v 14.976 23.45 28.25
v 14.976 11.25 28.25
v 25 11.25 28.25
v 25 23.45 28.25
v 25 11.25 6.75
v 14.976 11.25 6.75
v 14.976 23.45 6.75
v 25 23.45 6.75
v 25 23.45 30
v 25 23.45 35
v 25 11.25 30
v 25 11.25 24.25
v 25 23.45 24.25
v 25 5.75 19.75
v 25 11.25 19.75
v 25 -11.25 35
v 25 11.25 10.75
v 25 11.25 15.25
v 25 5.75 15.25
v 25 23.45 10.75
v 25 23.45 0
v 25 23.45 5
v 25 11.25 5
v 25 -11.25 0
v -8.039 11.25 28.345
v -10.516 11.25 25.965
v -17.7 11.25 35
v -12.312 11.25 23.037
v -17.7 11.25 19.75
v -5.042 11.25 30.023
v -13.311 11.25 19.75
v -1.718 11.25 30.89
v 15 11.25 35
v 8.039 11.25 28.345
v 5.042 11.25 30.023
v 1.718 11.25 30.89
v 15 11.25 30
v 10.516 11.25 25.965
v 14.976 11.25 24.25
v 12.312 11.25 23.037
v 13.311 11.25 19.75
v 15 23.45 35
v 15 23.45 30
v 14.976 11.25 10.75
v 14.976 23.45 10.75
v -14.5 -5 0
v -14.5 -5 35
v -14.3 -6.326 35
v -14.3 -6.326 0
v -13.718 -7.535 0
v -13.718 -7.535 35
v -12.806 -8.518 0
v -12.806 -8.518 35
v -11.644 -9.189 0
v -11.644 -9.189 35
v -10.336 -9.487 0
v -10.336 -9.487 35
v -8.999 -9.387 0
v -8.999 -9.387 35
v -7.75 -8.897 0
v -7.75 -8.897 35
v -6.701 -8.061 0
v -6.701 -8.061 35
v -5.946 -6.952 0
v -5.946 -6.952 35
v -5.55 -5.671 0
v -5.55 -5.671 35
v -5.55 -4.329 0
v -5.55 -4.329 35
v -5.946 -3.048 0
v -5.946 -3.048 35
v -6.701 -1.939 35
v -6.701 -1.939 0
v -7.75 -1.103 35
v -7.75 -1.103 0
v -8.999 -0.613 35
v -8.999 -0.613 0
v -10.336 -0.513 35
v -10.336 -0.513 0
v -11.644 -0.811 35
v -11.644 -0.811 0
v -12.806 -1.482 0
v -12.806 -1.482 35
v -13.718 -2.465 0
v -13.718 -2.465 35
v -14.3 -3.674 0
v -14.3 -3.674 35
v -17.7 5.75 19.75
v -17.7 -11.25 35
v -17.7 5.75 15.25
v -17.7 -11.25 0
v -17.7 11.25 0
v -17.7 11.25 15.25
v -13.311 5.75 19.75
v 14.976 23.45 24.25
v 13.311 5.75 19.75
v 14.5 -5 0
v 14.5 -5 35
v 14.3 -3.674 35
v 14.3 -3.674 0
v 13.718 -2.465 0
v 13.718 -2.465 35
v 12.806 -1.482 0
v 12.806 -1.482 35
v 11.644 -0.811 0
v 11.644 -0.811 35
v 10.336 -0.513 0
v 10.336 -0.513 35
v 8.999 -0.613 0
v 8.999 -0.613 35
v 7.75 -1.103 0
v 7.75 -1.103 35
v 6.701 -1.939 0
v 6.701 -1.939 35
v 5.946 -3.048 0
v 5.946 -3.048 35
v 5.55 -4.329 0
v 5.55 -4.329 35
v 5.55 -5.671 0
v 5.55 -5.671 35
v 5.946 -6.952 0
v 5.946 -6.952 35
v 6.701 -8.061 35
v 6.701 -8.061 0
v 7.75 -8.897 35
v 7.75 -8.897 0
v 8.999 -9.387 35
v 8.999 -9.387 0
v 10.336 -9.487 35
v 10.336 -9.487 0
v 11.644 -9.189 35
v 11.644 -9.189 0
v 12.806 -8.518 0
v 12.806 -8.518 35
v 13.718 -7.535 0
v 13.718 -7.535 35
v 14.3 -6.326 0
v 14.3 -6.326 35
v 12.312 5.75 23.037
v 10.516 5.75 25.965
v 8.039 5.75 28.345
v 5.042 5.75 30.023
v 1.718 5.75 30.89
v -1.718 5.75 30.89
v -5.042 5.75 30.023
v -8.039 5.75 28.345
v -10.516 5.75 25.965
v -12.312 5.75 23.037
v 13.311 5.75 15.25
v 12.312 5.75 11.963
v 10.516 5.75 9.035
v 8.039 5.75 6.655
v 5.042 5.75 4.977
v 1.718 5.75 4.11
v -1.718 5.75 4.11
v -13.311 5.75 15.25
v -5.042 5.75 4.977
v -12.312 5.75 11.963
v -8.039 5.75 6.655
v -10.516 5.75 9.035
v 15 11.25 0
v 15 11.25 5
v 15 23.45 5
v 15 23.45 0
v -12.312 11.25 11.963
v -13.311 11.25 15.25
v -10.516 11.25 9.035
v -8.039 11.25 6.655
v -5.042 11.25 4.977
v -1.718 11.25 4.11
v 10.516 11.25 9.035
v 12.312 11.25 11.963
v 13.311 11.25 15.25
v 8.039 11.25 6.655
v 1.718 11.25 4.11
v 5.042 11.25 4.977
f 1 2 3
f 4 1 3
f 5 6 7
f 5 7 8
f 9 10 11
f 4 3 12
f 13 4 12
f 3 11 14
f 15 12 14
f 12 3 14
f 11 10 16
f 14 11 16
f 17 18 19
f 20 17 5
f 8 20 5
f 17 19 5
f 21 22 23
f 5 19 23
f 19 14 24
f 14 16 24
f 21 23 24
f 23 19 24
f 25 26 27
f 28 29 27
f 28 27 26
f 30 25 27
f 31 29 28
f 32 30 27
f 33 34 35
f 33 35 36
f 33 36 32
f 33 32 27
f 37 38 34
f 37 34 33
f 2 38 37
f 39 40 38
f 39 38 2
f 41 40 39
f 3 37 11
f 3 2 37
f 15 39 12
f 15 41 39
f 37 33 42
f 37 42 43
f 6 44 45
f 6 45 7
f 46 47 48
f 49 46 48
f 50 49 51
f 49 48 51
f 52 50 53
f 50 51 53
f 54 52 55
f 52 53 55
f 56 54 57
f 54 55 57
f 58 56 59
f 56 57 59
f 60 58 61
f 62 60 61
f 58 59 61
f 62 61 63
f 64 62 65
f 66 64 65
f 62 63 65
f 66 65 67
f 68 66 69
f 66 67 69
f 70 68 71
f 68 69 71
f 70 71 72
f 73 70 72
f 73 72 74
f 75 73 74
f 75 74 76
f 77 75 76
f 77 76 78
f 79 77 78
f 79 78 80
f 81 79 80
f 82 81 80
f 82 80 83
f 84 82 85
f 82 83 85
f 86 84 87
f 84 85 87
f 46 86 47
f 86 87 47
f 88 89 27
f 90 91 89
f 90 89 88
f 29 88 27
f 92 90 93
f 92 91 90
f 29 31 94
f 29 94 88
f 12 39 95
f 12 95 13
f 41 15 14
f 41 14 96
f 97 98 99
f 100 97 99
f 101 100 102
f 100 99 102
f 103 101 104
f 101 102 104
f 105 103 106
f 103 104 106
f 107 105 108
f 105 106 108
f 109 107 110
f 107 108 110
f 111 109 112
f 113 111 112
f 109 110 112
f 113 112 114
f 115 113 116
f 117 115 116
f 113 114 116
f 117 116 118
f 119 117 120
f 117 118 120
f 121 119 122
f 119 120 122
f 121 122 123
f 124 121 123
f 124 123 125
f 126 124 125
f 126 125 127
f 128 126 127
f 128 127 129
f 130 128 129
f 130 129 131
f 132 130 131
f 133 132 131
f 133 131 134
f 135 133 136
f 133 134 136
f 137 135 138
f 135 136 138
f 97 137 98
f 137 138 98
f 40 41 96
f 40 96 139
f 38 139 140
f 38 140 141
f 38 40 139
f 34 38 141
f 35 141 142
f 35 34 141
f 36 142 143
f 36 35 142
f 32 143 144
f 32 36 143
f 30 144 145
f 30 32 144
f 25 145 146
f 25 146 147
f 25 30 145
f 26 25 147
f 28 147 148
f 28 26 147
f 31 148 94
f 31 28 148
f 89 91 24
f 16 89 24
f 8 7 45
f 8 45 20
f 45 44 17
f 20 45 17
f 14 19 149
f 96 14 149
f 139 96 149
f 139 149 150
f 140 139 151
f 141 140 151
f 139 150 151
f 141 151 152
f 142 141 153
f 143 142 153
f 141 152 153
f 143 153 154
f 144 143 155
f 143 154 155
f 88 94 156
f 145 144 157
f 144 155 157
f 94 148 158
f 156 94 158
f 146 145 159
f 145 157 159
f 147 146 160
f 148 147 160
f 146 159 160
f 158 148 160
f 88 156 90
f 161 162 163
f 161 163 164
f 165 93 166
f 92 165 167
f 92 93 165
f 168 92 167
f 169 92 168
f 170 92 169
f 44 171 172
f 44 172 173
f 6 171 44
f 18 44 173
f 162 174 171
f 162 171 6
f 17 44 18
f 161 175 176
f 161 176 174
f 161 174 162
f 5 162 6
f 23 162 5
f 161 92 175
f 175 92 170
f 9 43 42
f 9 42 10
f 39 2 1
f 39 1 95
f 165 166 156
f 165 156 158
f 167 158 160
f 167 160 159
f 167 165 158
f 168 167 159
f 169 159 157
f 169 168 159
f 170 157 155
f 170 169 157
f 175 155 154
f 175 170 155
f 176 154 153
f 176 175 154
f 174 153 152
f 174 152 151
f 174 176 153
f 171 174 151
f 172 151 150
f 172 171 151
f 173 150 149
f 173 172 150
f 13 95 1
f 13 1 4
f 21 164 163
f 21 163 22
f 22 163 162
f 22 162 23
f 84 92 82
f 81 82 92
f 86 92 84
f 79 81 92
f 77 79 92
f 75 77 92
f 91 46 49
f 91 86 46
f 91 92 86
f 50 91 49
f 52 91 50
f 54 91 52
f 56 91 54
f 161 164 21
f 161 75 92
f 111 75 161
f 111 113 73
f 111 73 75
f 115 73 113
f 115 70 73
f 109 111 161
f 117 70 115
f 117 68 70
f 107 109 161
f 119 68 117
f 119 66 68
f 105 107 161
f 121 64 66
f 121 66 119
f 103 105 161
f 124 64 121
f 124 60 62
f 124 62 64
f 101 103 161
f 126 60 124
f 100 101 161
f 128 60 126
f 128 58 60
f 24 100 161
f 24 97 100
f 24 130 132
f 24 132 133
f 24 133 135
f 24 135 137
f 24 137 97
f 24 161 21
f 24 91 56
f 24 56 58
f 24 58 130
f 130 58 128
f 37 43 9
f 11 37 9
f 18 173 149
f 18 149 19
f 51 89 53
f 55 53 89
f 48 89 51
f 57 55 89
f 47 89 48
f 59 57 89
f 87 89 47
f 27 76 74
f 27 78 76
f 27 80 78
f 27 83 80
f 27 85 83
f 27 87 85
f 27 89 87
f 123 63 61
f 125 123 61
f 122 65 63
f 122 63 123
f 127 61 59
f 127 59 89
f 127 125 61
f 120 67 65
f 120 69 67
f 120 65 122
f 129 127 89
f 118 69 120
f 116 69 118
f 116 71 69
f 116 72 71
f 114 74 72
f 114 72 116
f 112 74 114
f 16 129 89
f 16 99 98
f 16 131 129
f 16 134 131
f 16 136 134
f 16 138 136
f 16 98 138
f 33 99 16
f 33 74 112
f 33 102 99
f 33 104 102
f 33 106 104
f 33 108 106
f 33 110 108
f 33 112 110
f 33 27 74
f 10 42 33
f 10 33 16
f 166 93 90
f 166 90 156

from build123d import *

# Parameters (mm, degrees)
SKETCH1_W           = 50
SKETCH1_H           = 22.5
BOSS_EXTRUDE1_DEPTH = 35
SKETCH2_R           = 4.5
CUT_EXTRUDE1_DEPTH  = 35
CUT_EXTRUDE2_DEPTH  = 5.5
SKETCH4_W           = 10
SKETCH4_H           = 5
SKETCH4_W_2         = 10.024005515
SKETCH4_H_2         = 4
BOSS_EXTRUDE2_DEPTH = 12.2
SKETCH5_W           = 7.3
SKETCH5_H           = 22.5
CUT_EXTRUDE3_DEPTH  = 49.98879974


with BuildPart() as part:
    # Sketch1 → Boss-Extrude1 (new body)
    with BuildSketch(Plane.XY):
        Rectangle(SKETCH1_W, SKETCH1_H)
    extrude(amount=BOSS_EXTRUDE1_DEPTH)

    # Sketch2 → Cut-Extrude1 (cut)
    with BuildSketch(Plane.XY.offset(35)):
        with Locations((10, -5)):
            Circle(SKETCH2_R)
        with Locations(Location((-10, -5, 0), (0, 0, 180))):
            Circle(SKETCH2_R)
    extrude(amount=-CUT_EXTRUDE1_DEPTH, mode=Mode.SUBTRACT)

    # Sketch3 → Cut-Extrude2 (cut)
    with BuildSketch(Plane(origin=(0, 11.25, 0), x_dir=(1, 0, 0), z_dir=(0, 1, 0))):
        with BuildLine():
            Line((25, -19.75), (13.311179512, -19.75))
            ThreePointArc((13.311179512, -19.75), (0, -31), (-13.311179512, -19.75))
            Line((-13.311179512, -19.75), (-25, -19.75))
            Line((-25, -19.75), (-25, -15.25))
            Line((-25, -15.25), (-13.311179512, -15.25))
            ThreePointArc((-13.311179512, -15.25), (0, -4), (13.311179512, -15.25))
            Line((13.311179512, -15.25), (25, -15.25))
            Line((25, -15.25), (25, -19.75))
        make_face()
    extrude(amount=-CUT_EXTRUDE2_DEPTH, mode=Mode.SUBTRACT)

    # Sketch4 → Boss-Extrude2 (add)
    with BuildSketch(Plane(origin=(0, 11.25, 0), x_dir=(1, 0, 0), z_dir=(0, 1, 0))):
        with Locations((20, -2.5)):
            Rectangle(SKETCH4_W, SKETCH4_H)
        with Locations((19.987997243, -8.75)):
            Rectangle(SKETCH4_W_2, SKETCH4_H_2)
        with Locations((19.987997243, -26.25)):
            Rectangle(SKETCH4_W_2, SKETCH4_H_2)
        with Locations((20, -32.5)):
            Rectangle(SKETCH4_W, SKETCH4_H)
    extrude(amount=BOSS_EXTRUDE2_DEPTH)

    # Sketch5 → Cut-Extrude3 (cut, through all)
    with BuildSketch(Plane(origin=(0, 0, 0), x_dir=(-1, 0, 0), z_dir=(0, 0, -1))):
        with Locations((21.35, 0)):
            Rectangle(SKETCH5_W, SKETCH5_H)
    extrude(amount=-CUT_EXTRUDE3_DEPTH, mode=Mode.SUBTRACT)


solid = part.part
